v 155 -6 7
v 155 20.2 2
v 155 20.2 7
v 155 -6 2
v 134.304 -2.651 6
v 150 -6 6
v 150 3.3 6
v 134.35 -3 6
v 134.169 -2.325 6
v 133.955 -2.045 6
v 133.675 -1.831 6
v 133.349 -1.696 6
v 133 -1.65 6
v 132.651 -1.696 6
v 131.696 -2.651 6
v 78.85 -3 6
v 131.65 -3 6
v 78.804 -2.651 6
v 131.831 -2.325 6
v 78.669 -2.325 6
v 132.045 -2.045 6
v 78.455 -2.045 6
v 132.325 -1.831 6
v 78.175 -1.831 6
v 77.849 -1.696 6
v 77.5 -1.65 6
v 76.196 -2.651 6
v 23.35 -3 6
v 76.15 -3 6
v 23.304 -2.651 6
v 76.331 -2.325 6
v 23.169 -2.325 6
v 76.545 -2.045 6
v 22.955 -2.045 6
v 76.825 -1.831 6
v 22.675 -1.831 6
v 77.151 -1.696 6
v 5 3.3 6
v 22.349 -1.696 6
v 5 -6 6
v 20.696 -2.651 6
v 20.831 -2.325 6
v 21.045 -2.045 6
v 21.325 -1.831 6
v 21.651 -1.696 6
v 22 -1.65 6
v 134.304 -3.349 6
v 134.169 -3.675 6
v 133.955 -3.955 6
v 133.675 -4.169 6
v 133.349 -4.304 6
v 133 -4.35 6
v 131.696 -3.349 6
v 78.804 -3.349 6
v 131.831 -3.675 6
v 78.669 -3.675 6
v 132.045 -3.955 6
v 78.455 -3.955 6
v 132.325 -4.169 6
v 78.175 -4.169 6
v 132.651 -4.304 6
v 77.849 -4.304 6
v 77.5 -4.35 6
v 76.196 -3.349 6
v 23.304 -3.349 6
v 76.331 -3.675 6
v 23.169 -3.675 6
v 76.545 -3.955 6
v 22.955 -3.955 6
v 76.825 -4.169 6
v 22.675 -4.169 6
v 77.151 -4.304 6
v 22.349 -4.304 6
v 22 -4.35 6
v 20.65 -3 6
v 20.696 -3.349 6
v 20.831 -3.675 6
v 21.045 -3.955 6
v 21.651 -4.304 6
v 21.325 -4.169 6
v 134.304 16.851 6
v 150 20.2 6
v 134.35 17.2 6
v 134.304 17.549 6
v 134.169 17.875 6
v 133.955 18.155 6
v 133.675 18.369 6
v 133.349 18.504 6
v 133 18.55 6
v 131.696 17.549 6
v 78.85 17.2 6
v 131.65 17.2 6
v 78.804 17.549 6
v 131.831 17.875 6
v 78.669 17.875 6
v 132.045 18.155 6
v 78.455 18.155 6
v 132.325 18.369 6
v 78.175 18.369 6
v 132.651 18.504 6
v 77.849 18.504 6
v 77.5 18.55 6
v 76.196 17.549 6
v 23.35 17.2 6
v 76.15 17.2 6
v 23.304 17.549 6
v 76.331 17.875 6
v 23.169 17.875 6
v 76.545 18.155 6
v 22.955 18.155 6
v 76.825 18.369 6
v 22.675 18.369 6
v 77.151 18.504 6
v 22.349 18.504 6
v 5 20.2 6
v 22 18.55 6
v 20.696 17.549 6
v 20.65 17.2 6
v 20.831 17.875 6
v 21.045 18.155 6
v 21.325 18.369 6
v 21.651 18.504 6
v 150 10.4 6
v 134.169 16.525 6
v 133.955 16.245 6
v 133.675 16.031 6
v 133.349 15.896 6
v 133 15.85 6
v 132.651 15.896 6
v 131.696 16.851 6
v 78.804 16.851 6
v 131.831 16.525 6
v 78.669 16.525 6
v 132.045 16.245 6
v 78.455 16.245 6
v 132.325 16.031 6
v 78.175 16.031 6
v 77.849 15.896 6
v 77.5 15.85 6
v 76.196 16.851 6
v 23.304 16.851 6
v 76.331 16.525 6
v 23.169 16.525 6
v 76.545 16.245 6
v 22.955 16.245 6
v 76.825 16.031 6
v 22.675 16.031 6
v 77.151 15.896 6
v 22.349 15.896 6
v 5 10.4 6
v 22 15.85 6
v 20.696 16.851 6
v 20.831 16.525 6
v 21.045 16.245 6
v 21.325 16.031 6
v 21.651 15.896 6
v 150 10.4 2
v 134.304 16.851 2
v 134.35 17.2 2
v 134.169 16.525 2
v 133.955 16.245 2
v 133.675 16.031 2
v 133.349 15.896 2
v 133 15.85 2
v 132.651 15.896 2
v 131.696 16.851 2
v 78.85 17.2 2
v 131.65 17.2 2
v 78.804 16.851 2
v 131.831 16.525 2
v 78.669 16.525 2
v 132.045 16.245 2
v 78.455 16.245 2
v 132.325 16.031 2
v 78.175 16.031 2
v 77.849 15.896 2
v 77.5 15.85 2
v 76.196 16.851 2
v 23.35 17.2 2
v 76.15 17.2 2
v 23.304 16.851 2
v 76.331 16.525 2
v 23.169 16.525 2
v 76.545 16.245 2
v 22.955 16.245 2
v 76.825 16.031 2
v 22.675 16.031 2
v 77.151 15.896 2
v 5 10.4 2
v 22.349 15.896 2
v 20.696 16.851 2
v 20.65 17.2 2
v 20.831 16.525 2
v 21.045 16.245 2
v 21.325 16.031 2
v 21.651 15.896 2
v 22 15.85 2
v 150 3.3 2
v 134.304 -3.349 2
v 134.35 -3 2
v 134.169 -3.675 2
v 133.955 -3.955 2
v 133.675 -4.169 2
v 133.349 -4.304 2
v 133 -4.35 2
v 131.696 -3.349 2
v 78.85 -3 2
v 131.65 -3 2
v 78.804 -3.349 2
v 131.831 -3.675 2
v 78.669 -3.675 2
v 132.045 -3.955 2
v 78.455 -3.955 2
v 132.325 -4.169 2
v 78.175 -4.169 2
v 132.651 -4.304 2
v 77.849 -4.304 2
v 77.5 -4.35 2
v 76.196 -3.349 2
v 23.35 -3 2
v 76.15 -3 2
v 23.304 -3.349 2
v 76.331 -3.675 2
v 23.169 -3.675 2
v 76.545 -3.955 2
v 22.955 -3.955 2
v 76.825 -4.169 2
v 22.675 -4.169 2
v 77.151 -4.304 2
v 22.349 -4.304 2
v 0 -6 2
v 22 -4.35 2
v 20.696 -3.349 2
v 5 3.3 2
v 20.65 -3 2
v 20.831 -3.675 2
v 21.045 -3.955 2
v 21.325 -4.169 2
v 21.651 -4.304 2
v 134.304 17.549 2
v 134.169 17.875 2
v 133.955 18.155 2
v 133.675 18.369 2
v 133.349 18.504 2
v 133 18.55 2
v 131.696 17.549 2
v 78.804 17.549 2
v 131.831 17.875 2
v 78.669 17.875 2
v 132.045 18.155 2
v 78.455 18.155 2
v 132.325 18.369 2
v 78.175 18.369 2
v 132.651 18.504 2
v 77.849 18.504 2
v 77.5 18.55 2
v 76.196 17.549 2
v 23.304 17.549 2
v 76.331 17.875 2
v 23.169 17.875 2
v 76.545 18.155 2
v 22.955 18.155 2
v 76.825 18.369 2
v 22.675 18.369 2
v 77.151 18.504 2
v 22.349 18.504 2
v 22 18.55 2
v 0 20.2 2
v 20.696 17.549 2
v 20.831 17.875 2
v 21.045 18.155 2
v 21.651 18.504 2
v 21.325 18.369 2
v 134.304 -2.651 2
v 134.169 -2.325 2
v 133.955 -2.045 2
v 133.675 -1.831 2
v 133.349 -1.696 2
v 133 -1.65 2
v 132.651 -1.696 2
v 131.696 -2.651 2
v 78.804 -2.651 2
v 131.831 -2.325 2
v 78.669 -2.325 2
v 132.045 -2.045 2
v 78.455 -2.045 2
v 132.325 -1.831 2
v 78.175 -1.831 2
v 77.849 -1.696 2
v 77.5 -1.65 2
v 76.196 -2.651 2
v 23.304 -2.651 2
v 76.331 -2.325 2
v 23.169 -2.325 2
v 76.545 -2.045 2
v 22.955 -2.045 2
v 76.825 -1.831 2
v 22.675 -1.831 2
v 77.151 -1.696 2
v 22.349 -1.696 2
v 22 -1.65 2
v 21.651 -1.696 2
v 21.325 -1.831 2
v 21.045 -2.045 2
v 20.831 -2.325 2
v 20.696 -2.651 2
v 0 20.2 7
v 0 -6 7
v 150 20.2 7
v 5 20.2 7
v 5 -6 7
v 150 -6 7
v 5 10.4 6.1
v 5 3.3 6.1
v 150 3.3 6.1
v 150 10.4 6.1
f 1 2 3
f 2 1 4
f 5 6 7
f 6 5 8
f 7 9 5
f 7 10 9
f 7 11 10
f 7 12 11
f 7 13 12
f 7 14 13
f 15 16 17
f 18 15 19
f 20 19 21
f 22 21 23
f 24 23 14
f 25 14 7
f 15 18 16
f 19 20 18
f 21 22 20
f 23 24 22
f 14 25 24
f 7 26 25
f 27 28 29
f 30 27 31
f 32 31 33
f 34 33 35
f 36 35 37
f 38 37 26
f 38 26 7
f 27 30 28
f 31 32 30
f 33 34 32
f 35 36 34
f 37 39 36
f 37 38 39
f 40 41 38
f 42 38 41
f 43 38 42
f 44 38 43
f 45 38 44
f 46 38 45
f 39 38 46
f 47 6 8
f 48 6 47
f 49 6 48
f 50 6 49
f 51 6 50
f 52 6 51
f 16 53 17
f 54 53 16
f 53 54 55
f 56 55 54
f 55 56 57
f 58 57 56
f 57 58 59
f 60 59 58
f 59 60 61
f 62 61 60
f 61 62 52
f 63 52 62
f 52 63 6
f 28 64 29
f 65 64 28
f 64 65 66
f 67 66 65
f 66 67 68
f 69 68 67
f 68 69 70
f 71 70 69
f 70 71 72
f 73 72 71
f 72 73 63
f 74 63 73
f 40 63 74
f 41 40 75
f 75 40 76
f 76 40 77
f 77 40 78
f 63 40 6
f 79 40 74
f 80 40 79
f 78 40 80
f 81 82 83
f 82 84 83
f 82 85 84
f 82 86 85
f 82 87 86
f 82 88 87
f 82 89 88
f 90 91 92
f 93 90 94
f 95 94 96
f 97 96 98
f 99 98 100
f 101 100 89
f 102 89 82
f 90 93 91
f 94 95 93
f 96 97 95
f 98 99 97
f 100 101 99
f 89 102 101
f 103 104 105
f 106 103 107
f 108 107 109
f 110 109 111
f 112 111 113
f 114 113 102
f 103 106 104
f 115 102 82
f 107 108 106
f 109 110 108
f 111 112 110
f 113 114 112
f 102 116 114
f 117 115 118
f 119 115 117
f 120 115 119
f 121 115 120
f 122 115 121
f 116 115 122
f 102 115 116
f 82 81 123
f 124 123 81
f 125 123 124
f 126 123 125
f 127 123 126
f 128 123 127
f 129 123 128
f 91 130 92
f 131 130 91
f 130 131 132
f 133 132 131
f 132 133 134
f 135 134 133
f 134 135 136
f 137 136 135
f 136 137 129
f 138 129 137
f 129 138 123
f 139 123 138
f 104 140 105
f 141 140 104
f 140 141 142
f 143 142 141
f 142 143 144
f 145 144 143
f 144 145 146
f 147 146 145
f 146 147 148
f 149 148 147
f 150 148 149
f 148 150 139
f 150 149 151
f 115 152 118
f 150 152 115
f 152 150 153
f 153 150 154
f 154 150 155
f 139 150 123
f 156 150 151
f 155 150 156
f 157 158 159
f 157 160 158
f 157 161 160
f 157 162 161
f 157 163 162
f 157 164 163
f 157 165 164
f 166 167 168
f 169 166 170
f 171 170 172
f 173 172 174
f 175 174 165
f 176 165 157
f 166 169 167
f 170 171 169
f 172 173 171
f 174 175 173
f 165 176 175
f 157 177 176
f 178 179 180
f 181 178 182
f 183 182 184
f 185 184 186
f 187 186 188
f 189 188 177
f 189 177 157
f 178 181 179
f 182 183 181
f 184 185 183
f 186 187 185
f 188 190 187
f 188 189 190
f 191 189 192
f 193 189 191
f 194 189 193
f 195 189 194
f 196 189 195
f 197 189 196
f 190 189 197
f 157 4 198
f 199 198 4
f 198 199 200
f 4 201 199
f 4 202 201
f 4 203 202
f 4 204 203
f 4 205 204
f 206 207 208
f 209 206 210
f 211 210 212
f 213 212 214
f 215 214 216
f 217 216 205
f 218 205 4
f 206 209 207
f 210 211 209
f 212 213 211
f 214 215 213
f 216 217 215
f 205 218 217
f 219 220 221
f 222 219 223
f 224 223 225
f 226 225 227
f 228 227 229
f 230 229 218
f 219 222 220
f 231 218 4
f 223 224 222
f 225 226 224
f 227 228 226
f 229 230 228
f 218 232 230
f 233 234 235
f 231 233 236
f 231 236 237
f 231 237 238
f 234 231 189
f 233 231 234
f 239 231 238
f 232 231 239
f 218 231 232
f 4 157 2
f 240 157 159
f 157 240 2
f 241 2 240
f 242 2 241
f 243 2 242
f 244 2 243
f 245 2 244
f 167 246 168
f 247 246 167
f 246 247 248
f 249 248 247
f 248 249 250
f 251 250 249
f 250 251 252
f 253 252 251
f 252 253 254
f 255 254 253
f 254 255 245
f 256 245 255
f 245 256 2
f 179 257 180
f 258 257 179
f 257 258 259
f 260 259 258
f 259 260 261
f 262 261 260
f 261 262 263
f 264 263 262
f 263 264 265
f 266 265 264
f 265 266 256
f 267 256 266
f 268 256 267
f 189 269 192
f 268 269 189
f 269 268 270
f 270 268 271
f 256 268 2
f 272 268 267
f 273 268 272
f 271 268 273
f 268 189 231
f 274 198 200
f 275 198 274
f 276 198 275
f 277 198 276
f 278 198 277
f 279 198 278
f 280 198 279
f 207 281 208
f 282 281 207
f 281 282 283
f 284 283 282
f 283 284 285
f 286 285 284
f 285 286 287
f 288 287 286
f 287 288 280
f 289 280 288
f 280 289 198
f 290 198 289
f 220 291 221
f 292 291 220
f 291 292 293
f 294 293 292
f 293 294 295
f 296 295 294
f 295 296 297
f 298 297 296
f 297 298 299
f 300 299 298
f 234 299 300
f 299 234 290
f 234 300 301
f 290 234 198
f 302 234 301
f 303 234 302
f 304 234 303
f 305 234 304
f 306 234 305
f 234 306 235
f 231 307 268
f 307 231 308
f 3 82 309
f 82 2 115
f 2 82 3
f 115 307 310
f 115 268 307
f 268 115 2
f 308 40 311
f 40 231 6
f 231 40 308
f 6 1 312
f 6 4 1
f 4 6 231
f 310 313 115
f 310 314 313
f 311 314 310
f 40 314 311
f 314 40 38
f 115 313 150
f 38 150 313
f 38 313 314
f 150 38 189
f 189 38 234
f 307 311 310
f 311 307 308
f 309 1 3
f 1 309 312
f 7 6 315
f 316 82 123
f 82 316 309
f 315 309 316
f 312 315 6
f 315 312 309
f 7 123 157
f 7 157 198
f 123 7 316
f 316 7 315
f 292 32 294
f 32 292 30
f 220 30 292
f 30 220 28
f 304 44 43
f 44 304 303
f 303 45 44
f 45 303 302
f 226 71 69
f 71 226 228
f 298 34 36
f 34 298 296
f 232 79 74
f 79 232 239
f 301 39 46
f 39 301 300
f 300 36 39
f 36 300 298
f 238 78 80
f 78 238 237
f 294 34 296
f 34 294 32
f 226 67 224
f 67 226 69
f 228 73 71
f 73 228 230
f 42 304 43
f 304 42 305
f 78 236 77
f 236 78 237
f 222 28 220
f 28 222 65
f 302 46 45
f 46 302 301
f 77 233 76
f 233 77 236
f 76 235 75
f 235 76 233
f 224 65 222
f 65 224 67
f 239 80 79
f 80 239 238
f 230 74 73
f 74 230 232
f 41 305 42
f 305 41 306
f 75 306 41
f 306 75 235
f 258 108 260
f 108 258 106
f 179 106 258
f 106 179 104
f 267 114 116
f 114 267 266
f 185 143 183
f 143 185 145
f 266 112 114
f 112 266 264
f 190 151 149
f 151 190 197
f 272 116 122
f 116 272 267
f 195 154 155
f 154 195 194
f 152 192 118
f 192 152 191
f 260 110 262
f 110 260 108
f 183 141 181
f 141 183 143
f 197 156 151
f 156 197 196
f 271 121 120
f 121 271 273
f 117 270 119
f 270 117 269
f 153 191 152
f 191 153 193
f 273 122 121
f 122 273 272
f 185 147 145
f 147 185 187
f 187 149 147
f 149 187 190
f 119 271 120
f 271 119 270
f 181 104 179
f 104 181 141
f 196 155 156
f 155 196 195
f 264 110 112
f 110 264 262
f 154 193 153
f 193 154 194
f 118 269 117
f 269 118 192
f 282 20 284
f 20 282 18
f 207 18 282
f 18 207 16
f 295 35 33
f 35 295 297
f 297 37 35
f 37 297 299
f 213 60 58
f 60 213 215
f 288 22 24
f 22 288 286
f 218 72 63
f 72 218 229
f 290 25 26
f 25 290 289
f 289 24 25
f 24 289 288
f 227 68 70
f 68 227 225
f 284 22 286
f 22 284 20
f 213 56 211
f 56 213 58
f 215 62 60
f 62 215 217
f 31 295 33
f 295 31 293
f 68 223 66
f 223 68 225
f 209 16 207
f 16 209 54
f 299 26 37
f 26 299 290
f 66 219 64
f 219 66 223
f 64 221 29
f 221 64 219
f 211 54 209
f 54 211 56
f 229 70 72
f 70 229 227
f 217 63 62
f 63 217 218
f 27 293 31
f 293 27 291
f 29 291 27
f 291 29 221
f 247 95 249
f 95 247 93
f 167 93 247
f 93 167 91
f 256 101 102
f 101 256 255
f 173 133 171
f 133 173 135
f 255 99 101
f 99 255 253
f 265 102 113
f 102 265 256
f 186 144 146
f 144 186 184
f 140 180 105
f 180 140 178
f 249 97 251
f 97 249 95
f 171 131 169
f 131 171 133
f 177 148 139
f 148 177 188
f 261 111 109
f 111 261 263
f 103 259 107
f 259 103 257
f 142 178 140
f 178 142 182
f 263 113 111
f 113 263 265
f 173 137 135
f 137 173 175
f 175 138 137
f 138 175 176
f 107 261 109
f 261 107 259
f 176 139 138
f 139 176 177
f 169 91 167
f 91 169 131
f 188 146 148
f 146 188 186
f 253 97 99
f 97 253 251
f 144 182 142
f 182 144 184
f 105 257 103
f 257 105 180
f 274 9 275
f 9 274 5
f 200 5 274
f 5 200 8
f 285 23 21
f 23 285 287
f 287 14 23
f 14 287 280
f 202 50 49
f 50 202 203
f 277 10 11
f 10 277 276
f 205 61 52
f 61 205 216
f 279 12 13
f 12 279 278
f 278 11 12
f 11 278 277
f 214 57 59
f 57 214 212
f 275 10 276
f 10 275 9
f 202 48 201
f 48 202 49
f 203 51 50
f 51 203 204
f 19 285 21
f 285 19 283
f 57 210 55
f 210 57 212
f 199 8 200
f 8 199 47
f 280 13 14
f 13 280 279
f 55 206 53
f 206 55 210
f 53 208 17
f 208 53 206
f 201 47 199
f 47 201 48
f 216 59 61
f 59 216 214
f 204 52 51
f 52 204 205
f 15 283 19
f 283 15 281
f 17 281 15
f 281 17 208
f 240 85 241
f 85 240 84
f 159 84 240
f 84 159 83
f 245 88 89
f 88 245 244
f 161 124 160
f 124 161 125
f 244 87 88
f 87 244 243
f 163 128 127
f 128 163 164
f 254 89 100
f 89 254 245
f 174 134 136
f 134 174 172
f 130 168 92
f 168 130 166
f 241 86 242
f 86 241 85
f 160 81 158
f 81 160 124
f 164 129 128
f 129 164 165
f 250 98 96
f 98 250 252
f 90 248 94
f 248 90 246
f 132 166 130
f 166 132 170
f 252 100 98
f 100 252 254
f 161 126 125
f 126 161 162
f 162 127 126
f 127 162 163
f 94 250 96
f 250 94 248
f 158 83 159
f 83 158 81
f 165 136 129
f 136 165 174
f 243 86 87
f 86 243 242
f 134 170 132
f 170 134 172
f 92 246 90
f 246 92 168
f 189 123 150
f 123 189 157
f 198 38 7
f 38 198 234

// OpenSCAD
// bar.scad — 排版长条（字粒夹持器）
//
// 结构：上下夹（base + cover），字粒被夹在中间
//   底板 base   两块托唇把字粒板托住，字从中间 8.2mm 的开口凸出
//   压盖 cover  从上方压住字粒板的顶面，6 颗 M3 拧紧
//
// 为什么不用「侧向螺杆顶紧」：
//   A→A / K→A / A→V 这些相邻对的墨迹间隙是负的（−0.15 ~ −0.10mm），
//   侧向大力挤压会让相邻字形互相顶住、把 A 的右腿压弯。
//   上下夹只压 Z 向，横向靠摩擦锁定，字距自然 = 各块 advance 之和，
//   和整块方案的印刷结果逐对一致。
//
// 为什么不用「端部装填」：
//   18 个字符从端面一个个塞进去要来回倒手；从上方放，摆错顺序一眼能看见、随手能改。
//
// 关键尺寸：
//   字粒板 14.0 × 1.5，凸出字高 6.0
//   开口 7.10mm（y 3.30~10.40）—— 由字形在 Y 向的真实范围决定：
//     普通字母 y 4.02~9.98，O/S/C/G 因 overshoot 到 10.09，
//     Q 的尾巴最低到 y=3.554（比基线低 0.46）—— 开口必须放过 Q，
//     否则 Q 会被托唇顶住坐不到底，整排基线就歪了。
//     取 3.30 起点，对 Q 留 0.25、对板前缘留 3.30 的托唇。
//   底板下沿离纸面 2.0mm（压印时托唇不沾墨）
//
// 坐标：X 沿长条，Y 沿字粒进深（y=0 是字粒板前缘），Z 向上（z=0 是印面）

part = 0;        // 0 = 底板，1 = 压盖

// ---- 排字区 ----
chan_len   = 145.0;   // 可用排字长度（18 个 W = 138.3，留 6.7 余量）
base_len   = 155.0;   // 底板总长 = chan_len + 2 × bridge
bridge     = 5.0;     // 两端挡墙（同时挡住字粒不许滑出）

// ---- Y 向 ----
plate_w    = 14.1;    // 字粒板 14.0 + 0.1 配合间隙
slot_y0    = 3.30;    // 字凸出开口的前沿
slot_w     = 7.10;    // 开口宽 —— 由 Q 的尾巴决定，见下
rail_f     = 9.30;    // 前轨宽（含螺丝位）
rail_b     = 9.80;    // 后轨宽
base_w     = rail_f + slot_w + rail_b;   // 26.2
cover_w    = 30.0;    // 压盖比底板宽 3.8，两侧各留 1.9 的盖沿
                      // —— 26.2 上放不下 φ6.2 沉头孔（字粒板占掉中间 14.1，
                      //    外侧只剩 6.0），加宽后沉头孔才不破边，顺便多个抠手边

// ---- Z 向 ----
clear      = 2.0;     // 底板下沿离纸面
plate_z    = 6.0;     // 字粒板底面（= 托唇顶面）
plate_t    = 1.5;     // 字粒板厚
base_t     = plate_z - clear;      // 4.0
cover_t    = 9.0;
cover_z    = plate_z + plate_t;    // 7.5 = 压盖下沿

// 挡墙只升到 7.0，比字粒板顶面低 0.5 —— 压盖只压在字粒上，
// 力才走得通「螺丝 → 压盖 → 字粒 → 托唇 → 底板 → 螺丝」这个闭环。
stop_h     = 1.0;

// ---- 螺丝 ----
screw_x    = [22, 77.5, 133];
screw_y    = [-3.0, 17.2];
pilot_d    = 2.7;     // M3 自攻导孔
clear_d    = 3.4;     // 压盖过孔
cbore_d    = 6.2;     // 沉头孔（M3 内六角头 φ5.5）
cbore_dp   = 3.2;

y0 = slot_y0 - rail_f;            // = -6.0（底板前缘）
cy0 = y0 - (cover_w - base_w) / 2;  // = -7.9（压盖前缘）

$fa = 4;
$fs = 0.4;

module base() {
    difference() {
        union() {
            translate([0, y0, clear]) cube([base_len, base_w, base_t]);
            translate([0, y0, plate_z]) cube([bridge, base_w, stop_h]);
            translate([base_len - bridge, y0, plate_z])
                cube([bridge, base_w, stop_h]);
        }
        // 字粒凸出槽（打穿底板）
        translate([bridge, slot_y0, clear - 0.1])
            cube([base_len - 2 * bridge, slot_w, base_t + 0.2]);
        // 螺丝导孔（打穿，M3×14 拧进去 3.5mm 不会露头）
        for (x = screw_x, y = screw_y)
            translate([x, y, clear - 0.1])
                cylinder(d = pilot_d, h = base_t + 0.2, $fn = 24);
    }
}

module cover() {
    difference() {
        translate([0, cy0, cover_z]) cube([base_len, cover_w, cover_t]);
        for (x = screw_x, y = screw_y) {
            translate([x, y, cover_z - 0.1])
                cylinder(d = clear_d, h = cover_t + 0.2, $fn = 24);
            translate([x, y, cover_z + cover_t - cbore_dp])
                cylinder(d = cbore_d, h = cbore_dp + 0.1, $fn = 32);
        }
    }
}

if (part == 0) base();
else cover();
